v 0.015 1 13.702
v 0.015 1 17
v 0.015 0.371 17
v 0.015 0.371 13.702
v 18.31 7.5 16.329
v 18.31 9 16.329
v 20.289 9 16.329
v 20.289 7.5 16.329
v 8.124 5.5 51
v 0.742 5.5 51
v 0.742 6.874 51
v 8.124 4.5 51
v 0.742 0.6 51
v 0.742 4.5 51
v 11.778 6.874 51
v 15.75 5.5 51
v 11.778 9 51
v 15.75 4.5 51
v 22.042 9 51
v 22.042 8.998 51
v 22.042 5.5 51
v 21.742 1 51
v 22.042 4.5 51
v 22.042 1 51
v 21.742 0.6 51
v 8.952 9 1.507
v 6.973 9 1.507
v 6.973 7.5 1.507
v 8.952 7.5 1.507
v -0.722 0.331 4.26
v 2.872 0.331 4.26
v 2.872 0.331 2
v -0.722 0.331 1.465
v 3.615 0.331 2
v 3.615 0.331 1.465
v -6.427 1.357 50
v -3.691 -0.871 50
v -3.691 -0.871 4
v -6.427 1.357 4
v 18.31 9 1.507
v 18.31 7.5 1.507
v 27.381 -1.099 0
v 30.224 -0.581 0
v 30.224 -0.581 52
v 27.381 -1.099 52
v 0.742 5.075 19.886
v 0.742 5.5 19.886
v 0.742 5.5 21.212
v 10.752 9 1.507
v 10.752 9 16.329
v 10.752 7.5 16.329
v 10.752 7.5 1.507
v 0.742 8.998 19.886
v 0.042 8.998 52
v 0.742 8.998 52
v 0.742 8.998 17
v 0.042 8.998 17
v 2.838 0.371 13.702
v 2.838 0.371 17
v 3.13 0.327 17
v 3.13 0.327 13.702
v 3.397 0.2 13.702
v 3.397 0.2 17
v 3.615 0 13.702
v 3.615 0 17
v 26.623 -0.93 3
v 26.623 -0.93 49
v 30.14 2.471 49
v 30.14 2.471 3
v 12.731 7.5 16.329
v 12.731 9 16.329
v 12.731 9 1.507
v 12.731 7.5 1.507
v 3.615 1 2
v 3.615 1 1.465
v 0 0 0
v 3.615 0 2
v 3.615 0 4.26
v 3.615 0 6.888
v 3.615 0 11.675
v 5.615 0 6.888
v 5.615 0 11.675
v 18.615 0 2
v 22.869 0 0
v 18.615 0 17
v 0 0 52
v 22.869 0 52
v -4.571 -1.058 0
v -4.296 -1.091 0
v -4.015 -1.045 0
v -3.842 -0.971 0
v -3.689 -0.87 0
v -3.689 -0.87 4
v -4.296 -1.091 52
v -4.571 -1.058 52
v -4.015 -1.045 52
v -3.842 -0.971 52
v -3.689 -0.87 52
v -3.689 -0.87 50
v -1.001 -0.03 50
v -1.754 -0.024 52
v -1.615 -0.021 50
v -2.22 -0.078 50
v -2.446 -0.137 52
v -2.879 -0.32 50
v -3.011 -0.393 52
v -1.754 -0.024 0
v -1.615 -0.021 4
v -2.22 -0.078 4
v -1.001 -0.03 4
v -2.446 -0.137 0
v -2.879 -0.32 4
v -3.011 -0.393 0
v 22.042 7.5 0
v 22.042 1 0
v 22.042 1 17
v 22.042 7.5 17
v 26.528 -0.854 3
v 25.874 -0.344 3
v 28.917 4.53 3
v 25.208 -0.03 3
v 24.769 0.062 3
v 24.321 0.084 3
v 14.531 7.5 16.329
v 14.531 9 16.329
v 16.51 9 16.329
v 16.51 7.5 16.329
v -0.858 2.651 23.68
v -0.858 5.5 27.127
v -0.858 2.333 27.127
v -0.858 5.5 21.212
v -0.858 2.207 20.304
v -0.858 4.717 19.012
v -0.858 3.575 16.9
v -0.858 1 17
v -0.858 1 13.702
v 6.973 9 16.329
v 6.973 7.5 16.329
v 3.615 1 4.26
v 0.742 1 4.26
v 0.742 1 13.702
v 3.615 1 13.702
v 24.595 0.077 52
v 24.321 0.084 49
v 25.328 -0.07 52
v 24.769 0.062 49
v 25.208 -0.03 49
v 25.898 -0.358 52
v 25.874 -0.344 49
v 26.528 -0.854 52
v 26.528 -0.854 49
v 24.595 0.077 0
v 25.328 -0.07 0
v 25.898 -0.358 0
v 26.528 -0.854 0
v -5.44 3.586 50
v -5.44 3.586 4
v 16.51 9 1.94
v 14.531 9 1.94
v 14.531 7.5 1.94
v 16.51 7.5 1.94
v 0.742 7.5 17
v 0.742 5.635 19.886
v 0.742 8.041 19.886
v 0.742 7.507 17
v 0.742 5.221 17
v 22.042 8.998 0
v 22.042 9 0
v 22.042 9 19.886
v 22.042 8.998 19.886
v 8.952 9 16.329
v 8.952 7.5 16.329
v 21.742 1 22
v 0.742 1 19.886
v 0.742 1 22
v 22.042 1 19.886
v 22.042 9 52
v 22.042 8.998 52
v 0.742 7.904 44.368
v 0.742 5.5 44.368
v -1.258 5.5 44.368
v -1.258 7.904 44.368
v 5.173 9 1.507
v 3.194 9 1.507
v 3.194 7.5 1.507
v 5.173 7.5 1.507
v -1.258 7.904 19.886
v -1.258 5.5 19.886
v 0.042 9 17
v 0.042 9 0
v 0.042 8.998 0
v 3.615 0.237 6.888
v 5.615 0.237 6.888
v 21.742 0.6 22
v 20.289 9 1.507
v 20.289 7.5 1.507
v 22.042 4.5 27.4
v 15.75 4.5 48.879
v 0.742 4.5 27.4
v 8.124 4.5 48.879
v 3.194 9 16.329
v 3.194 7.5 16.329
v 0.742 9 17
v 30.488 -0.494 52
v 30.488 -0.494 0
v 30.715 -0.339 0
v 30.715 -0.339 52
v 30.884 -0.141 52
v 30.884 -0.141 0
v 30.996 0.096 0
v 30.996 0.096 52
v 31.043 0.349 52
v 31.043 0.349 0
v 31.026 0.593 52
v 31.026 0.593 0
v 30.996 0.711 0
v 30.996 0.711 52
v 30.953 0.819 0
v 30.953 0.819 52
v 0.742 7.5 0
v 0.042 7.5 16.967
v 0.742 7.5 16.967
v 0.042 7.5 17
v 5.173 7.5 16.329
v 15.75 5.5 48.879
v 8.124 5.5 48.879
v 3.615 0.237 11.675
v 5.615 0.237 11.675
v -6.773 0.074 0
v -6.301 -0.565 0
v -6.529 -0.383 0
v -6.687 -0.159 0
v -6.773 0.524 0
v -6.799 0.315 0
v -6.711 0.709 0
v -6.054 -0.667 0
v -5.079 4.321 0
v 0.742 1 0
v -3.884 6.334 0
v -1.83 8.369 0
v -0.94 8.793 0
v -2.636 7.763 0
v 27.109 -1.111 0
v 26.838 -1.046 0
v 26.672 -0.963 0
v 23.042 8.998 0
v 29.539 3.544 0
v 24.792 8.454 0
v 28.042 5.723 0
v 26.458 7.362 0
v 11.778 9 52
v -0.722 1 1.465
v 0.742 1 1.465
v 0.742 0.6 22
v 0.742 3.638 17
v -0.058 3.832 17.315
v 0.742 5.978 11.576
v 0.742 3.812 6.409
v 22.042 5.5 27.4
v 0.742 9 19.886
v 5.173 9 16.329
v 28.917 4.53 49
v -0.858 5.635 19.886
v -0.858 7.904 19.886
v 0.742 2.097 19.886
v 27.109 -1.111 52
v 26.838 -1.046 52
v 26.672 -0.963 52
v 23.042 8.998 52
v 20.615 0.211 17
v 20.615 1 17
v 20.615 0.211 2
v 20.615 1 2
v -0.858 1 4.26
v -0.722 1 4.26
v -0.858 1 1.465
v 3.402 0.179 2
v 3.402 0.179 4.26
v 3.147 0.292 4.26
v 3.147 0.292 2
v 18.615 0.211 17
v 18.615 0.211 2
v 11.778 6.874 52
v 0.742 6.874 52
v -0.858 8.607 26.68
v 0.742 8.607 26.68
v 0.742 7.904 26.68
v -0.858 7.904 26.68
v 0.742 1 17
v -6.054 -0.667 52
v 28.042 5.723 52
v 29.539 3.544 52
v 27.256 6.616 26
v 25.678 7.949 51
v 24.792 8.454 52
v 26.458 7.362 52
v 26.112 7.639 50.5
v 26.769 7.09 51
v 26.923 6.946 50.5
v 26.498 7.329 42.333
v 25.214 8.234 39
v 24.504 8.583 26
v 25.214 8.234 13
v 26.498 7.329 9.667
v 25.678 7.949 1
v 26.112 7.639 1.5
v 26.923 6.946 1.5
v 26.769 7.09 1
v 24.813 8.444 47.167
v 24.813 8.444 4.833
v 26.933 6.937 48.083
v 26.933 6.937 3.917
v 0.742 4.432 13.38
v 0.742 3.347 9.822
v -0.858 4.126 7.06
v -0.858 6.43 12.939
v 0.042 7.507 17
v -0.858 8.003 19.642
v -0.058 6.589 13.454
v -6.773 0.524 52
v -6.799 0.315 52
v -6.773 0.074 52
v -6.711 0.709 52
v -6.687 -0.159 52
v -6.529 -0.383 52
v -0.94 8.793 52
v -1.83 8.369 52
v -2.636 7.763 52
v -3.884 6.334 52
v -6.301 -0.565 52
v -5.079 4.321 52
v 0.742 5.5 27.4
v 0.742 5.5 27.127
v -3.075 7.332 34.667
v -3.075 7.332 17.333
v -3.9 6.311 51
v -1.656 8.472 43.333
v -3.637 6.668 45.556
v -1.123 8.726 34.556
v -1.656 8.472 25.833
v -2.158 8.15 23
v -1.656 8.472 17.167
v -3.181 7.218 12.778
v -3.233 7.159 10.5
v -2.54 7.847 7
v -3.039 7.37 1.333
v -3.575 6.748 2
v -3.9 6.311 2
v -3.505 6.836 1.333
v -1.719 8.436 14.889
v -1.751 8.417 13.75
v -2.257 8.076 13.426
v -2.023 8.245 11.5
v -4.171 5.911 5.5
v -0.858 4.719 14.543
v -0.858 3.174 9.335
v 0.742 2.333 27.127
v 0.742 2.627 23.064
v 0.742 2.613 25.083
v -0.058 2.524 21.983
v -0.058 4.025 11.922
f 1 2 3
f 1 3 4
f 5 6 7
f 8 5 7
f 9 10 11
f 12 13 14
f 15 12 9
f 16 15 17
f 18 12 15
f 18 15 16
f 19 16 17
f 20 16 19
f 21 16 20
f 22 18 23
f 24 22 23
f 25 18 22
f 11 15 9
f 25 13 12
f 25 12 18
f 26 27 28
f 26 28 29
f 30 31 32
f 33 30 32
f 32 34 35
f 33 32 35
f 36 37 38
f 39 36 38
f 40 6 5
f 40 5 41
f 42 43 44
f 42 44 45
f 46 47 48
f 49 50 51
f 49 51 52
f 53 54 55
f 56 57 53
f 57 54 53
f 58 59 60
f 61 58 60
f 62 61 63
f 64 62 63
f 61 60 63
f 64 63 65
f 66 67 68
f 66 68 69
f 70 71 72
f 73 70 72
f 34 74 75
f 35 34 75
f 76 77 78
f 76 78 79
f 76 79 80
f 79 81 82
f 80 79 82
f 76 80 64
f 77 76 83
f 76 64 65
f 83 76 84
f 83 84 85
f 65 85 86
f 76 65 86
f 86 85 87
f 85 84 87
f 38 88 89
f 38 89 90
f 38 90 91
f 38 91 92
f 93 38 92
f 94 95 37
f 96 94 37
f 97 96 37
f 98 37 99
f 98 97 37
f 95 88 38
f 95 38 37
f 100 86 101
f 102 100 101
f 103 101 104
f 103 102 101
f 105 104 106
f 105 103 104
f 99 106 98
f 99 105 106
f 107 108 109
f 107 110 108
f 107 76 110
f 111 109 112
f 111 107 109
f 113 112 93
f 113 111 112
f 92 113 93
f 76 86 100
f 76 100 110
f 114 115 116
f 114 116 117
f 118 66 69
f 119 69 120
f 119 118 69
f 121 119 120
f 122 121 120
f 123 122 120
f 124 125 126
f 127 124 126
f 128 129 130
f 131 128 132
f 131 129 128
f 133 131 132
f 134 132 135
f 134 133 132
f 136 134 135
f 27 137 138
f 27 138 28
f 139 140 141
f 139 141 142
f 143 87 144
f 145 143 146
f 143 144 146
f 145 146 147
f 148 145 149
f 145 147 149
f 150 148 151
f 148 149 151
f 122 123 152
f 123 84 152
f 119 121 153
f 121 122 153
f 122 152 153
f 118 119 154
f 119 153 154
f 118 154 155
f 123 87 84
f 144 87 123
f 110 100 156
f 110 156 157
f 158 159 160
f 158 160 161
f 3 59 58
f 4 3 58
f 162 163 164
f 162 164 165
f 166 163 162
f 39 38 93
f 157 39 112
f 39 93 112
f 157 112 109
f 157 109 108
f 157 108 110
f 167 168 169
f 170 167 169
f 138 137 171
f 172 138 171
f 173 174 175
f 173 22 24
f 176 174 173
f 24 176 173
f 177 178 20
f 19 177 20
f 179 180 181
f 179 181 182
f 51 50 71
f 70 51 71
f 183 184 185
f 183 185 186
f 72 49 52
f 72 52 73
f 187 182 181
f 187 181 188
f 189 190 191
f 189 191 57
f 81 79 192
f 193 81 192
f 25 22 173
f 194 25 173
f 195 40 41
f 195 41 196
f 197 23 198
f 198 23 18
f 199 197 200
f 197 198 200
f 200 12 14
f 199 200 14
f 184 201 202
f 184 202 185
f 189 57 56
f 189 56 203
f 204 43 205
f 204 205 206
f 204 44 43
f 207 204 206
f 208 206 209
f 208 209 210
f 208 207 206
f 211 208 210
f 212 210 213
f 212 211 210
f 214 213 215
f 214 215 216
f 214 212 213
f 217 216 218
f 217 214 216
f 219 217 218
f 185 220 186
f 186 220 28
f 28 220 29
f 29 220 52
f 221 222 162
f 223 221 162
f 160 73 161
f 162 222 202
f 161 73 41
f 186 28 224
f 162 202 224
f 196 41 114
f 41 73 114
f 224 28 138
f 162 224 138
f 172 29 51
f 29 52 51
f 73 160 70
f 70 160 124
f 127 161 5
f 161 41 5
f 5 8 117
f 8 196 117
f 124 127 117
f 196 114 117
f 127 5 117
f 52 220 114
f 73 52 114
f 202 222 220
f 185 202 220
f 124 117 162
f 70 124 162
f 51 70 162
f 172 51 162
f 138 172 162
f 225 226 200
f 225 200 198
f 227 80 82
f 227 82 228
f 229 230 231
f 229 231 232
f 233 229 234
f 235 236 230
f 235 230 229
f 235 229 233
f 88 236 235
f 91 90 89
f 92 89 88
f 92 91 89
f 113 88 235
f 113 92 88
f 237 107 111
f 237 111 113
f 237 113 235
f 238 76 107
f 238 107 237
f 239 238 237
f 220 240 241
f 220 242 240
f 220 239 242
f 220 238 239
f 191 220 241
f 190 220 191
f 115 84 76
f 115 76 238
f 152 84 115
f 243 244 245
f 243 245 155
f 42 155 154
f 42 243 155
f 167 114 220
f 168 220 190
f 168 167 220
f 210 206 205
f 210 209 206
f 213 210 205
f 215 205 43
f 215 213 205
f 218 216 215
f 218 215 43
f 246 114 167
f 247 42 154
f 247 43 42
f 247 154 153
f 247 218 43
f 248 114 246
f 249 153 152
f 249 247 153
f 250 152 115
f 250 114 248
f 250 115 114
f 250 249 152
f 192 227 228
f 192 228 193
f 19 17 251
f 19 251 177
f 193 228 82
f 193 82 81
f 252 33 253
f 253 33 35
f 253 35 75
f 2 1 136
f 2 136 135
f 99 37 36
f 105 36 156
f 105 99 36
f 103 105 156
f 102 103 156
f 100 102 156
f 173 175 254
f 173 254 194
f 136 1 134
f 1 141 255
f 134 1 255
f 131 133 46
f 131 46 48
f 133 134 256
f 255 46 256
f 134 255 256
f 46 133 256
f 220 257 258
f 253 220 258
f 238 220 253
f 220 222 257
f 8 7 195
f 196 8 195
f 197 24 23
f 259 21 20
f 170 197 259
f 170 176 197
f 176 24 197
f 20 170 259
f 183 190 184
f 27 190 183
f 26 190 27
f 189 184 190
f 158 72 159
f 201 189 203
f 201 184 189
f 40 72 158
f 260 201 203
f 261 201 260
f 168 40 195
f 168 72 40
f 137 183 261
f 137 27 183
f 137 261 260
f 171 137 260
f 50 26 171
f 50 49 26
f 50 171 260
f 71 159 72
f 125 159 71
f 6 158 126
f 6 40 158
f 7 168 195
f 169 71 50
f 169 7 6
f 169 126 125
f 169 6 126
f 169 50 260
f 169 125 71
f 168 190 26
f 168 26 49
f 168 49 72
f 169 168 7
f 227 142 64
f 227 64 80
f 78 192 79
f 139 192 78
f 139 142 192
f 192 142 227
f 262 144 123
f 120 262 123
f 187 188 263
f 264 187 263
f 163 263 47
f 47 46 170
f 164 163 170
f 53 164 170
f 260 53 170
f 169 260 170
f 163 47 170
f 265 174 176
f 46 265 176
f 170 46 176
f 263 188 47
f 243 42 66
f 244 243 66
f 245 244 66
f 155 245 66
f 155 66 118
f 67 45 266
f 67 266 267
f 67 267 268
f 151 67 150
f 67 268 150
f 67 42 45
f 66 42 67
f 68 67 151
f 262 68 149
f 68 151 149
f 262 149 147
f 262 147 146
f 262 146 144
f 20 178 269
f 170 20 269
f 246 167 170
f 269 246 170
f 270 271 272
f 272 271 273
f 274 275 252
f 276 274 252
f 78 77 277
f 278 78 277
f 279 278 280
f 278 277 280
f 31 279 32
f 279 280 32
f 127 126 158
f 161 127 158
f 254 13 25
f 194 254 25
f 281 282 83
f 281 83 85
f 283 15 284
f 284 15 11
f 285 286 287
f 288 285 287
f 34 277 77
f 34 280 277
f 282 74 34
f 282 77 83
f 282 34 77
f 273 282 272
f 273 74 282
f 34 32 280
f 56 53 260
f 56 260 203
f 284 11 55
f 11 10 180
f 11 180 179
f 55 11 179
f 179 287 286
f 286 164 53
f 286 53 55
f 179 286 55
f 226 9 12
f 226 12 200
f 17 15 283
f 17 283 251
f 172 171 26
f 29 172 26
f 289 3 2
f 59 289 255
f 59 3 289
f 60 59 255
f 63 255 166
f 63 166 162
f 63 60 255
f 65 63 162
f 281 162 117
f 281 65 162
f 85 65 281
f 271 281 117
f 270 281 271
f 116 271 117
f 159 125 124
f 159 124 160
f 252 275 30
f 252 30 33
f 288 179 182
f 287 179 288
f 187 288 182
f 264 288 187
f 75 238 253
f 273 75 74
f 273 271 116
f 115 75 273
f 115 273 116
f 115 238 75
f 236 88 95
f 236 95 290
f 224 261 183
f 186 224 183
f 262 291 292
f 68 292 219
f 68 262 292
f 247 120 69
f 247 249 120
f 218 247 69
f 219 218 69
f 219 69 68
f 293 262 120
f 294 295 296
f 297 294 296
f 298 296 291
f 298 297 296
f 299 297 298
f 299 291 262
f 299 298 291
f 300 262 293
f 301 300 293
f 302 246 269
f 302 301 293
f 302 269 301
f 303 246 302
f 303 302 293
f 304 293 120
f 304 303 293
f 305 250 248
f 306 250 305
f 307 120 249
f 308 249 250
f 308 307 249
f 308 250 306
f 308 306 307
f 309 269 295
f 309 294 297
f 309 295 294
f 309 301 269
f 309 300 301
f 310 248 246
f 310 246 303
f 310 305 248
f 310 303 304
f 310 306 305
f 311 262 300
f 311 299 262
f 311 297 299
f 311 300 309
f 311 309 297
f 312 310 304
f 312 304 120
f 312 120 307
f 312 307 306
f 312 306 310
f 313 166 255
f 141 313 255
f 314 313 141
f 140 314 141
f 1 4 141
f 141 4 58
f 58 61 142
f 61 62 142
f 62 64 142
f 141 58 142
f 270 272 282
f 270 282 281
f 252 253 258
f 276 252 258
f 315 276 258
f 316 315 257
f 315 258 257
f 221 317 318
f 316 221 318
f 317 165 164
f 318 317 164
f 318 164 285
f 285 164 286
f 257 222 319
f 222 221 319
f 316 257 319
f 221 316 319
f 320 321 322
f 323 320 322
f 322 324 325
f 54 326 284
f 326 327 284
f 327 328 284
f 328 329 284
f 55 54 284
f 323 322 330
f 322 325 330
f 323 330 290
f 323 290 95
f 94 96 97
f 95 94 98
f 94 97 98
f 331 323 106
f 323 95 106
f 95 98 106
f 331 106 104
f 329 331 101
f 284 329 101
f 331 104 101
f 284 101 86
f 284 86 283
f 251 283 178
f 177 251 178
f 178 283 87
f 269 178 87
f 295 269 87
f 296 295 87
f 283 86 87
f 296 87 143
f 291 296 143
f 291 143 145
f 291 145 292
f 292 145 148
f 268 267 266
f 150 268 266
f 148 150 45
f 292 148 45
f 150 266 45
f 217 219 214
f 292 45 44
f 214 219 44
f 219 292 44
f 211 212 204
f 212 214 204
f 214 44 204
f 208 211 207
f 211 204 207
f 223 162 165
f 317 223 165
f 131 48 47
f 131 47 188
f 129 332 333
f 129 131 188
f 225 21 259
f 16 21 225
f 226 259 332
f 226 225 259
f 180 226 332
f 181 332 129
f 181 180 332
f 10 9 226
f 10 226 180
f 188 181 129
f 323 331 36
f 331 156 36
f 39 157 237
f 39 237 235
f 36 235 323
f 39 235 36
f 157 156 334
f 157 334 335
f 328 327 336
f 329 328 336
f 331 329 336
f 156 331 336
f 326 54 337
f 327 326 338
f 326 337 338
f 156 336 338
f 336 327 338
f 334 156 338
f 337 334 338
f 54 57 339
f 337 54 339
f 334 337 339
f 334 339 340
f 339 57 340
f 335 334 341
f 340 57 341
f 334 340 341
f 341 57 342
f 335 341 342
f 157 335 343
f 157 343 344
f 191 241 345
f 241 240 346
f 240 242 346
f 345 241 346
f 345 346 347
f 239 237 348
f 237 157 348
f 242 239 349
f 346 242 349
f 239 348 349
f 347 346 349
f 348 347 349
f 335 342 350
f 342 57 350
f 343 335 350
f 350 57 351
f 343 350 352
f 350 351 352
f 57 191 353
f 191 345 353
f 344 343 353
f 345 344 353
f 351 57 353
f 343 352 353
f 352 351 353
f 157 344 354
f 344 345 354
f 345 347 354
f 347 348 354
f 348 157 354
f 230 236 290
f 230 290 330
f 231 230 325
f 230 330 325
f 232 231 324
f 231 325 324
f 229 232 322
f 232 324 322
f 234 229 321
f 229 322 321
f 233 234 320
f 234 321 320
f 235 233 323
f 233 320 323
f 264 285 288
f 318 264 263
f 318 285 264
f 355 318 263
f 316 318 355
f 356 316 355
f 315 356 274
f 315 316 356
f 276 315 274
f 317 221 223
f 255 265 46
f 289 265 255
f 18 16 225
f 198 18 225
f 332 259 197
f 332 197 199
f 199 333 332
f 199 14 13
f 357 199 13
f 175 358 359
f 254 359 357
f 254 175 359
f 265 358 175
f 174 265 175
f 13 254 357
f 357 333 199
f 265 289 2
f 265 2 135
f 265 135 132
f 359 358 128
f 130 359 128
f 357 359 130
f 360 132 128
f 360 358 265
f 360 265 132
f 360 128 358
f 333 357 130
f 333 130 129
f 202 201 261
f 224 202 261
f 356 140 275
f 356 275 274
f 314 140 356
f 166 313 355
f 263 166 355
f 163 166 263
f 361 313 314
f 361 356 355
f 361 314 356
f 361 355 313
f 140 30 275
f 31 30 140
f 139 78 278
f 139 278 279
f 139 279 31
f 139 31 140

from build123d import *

# Parameters (mm, degrees)
BOSS_EXTRUDE2_DEPTH      = 52
FILLET2_R                = 1
CUT_EXTRUDE2_DEPTH       = 3
CUT_EXTRUDE2_DEPTH_BACK  = 6
SKETCH10_W               = 2.350757351
SKETCH10_H               = 46
SKETCH11_W               = 17
SKETCH11_H               = 15
PELTIER_DEPTH            = 10
SKETCH12_W               = 21
SKETCH12_H               = 29
BATTERY_DEPTH            = 0.4
SKETCH14_W               = 21.3
SKETCH14_H               = 1
BOSS_EXTRUDE4_DEPTH      = 7.999920354
SKETCH15_W               = 3.297714658
SKETCH15_H               = 0.629450307
CUT_EXTRUDE5_DEPTH       = 3.6
SKETCH16_W               = 2.795507754
SKETCH16_H               = 0.669410668
CUT_EXTRUDE6_DEPTH       = 4.337027413
FILLET3_R                = 1
CUT_EXTRUDE7_DEPTH       = 1.6
CUT_EXTRUDE8_DEPTH       = 1.6
FILLET4_R                = 1
FILLET5_R                = 1
SKETCH19_W               = 21.3
SKETCH19_H               = 1
BOSS_EXTRUDE5_DEPTH      = 23.6
SKETCH20_W               = 7.625924169
SKETCH20_H               = 2.120993271
CUT_EXTRUDE9_DEPTH       = 2.6
SKETCH21_W               = 21.3
SKETCH21_H               = 2.886084762
BOSS_EXTRUDE6_DEPTH      = 8
SKETCH22_W               = 17
SKETCH22_H               = 1.5
BOSS_EXTRUDE7_DEPTH      = 22
SKETCH23_W               = 24.481547991
SKETCH23_H               = 2.403526745
CUT_EXTRUDE10_DEPTH      = 2
SKETCH24_W               = 15
SKETCH24_H               = 0.211445756
BOSS_EXTRUDE8_DEPTH      = 2
SKETCH25_W               = 4.787241237
SKETCH25_H               = 0.237383131
BOSS_EXTRUDE9_DEPTH      = 2
SKETCH26_W               = 11.036128308
SKETCH26_H               = 2.126226966
CUT_EXTRUDE11_DEPTH      = 2
CUT_EXTRUDE12_DEPTH      = 2
CUT_EXTRUDE12_DEPTH_BACK = 11
SKETCH27_W               = 46
SKETCH27_H               = 2.33
SKETCH28_W               = 1.978966
SKETCH28_H               = 14.822133623
SKETCH28_H_2             = 14.389327905
SKETCH28_W_2             = 1.978965999
CUT_EXTRUDE13_DEPTH      = 3


with BuildPart() as part:
    # Sketch1 → Boss-Extrude2 (new body)
    with BuildSketch(Plane.XY):
        with BuildLine():
            Line((-4.066957942, -1.190846618), (-7.240355005, -0.354620493))
            add(Edge.make_bspline(
                [(0.042333709, 8.998333002), (-4.213116867, 8.648828695), (-5.962383558, 1.81462105), (-7.240355005, -0.354620493)],
                knots=[0, 0, 0, 0, 1, 1, 1, 1], degree=3))
            Line((0.042333709, 8.998333002), (0.742333709, 8.998333002))
            Line((0.742333709, 8.998333002), (0.742333709, 1))
            Line((0.742333709, 1), (22.042333709, 1))
            Line((22.042333709, 1), (22.042333709, 8.998333002))
            Line((22.042333709, 8.998333002), (23.042333709, 8.998333002))
            add(Edge.make_bspline(
                [(23.042333709, 8.998333002), (27.852391375, 8.27132168), (31.467788923, -0.354620493)],
                knots=[0, 0, 0, 1, 1, 1], degree=2))
            Line((31.467788923, -0.354620493), (26.875523276, -1.190846618))
            add(Edge.make_bspline(
                [(22.86911945, 0), (24.564241842, 0.074416087), (25.297281614, 0.429058332), (26.875523276, -1.190846618)],
                knots=[0, 0, 0, 0, 1, 1, 1, 1], degree=3))
            Line((22.86911945, 0), (0, 0))
            add(Edge.make_bspline(
                [(0, 0), (-1.870814346, -0.163675047), (-2.239916233, 0.430706612), (-4.066957942, -1.190846618)],
                knots=[0, 0, 0, 0, 1, 1, 1, 1], degree=3))
        make_face()
    extrude(amount=BOSS_EXTRUDE2_DEPTH)

    # Fillet2
    fillet2_edges = [part.edges().sort_by_distance(p)[0] for p in [
        (-4.066957942, -1.190846618, 26),
        (-7.240355005, -0.354620493, 26),
    ]]
    fillet(fillet2_edges, radius=FILLET2_R)

    # Sketch10 → Cut-Extrude2 (cut, two sides: drawn at the far end of the back side and taken through both)
    with BuildSketch(Plane(origin=(-4.380890916, 3.569201652, 0), x_dir=(0.6316290075695021, 0.7752707893354205, 0), z_dir=(-0.7752707893354205, 0.6316290075695021, 0)).offset(-CUT_EXTRUDE2_DEPTH_BACK)):
        with Locations((-1.831509184, -27)):
            Rectangle(SKETCH10_W, SKETCH10_H)
    extrude(amount=CUT_EXTRUDE2_DEPTH + CUT_EXTRUDE2_DEPTH_BACK, mode=Mode.SUBTRACT)

    # Sketch11 → Peltier (cut)
    with BuildSketch(Plane(origin=(0, 1, 0), x_dir=(1, 0, 0), z_dir=(0, 1, 0))):
        with Locations((12.114692368, -9.5)):
            Rectangle(SKETCH11_W, SKETCH11_H)
    extrude(amount=-PELTIER_DEPTH, mode=Mode.SUBTRACT)

    # Sketch12 → Battery (cut)
    with BuildSketch(Plane(origin=(0, 1, 0), x_dir=(1, 0, 0), z_dir=(0, 1, 0))):
        with Locations((11.242333709, -36.5)):
            Rectangle(SKETCH12_W, SKETCH12_H)
    extrude(amount=-BATTERY_DEPTH, mode=Mode.SUBTRACT)

    # Sketch14 → Boss-Extrude4 (add)
    with BuildSketch(Plane(origin=(0, 1, 0), x_dir=(1, 0, 0), z_dir=(0, 1, 0))):
        with Locations((11.392333709, -51.5)):
            Rectangle(SKETCH14_W, SKETCH14_H)
    extrude(amount=BOSS_EXTRUDE4_DEPTH)

    # Sketch15 → Cut-Extrude5 (cut)
    with BuildSketch(Plane(origin=(3.614692368, 0, 0), x_dir=(0, 0, -1), z_dir=(1, 0, 0))):
        with Locations((-15.351142671, 0.685274847)):
            Rectangle(SKETCH15_W, SKETCH15_H)
    extrude(amount=-CUT_EXTRUDE5_DEPTH, mode=Mode.SUBTRACT)

    # Sketch16 → Cut-Extrude6 (cut)
    with BuildSketch(Plane(origin=(3.614692368, 0, 0), x_dir=(0, 0, -1), z_dir=(1, 0, 0))):
        with Locations((-2.862635658, 0.665294666)):
            Rectangle(SKETCH16_W, SKETCH16_H)
    extrude(amount=-CUT_EXTRUDE6_DEPTH, mode=Mode.SUBTRACT)

    # Fillet3
    # the kernel refuses this fillet: 1 mm, written as the material it takes off along each edge
    with BuildSketch(Plane(origin=(3.614692368, 0.330589332, 2), x_dir=(0, -1, 0), z_dir=(0, 0, 1))) as fillet3_piece_1:
        with BuildLine():
            CenterArc((1, -0.742892561), FILLET3_R, 132.021596152, 47.978403848)
            Line((0, -0.742892561), (0, 0))
            Line((0, 0), (0.330589332, 0))
        make_face()
    extrude(amount=2.260389535, mode=Mode.SUBTRACT)
    with BuildSketch(Plane(origin=(3.614692368, 0.370549693, 17), x_dir=(0, -1, 0), z_dir=(0, 0, -1))) as fillet3_piece_2:
        with BuildLine():
            CenterArc((1, 0.77704074), FILLET3_R, 180, 50.990421184)
            Line((0, 0.77704074), (0, 0))
            Line((0, 0), (0.370549693, 0))
        make_face()
    extrude(amount=3.297714658, mode=Mode.SUBTRACT)

    # Sketch17 → Cut-Extrude7 (cut)
    with BuildSketch(Plane(origin=(0.742333709, 0, 0), x_dir=(0, 0, -1), z_dir=(1, 0, 0))):
        with BuildLine():
            Line((-26.679947222, 8.607264172), (-26.679947222, 5.897267678))
            add(Edge.make_bspline(
                [(-4.260389535, 1), (-14.867625221, 6.272509714), (-26.679947222, 5.897267678)],
                knots=[0, 0, 0, 1, 1, 1], degree=2))
            Line((-4.260389535, 1), (-1.464881781, 1))
            add(Edge.make_bspline(
                [(-1.464881781, 1), (-12.835212302, 8.374655541), (-26.679947222, 8.607264172)],
                knots=[0, 0, 0, 1, 1, 1], degree=2))
        make_face()
    extrude(amount=-CUT_EXTRUDE7_DEPTH, mode=Mode.SUBTRACT)

    # Sketch18 → Cut-Extrude8 (cut)
    with BuildSketch(Plane(origin=(0.742333709, 0, 0), x_dir=(0, 0, -1), z_dir=(1, 0, 0))):
        with BuildLine():
            Line((-27.127269804, 2.333242891), (-27.127269804, 5.881050361))
            add(Edge.make_bspline(
                [(-13.702285342, 1), (-19.59820355, 6.798459793), (-27.127269804, 5.881050361)],
                knots=[0, 0, 0, 1, 1, 1], degree=2))
            Line((-13.702285342, 1), (-17, 1))
            add(Edge.make_bspline(
                [(-17, 1), (-21.902562333, 3.381704282), (-27.127269804, 2.333242891)],
                knots=[0, 0, 0, 1, 1, 1], degree=2))
        make_face()
    extrude(amount=-CUT_EXTRUDE8_DEPTH, mode=Mode.SUBTRACT)

    # Fillet4
    fillet4_edges = [part.edges().sort_by_distance(p)[0] for p in [
        (26.875523276, -1.190846618, 26),
    ]]
    fillet(fillet4_edges, radius=FILLET4_R)

    # Fillet5
    fillet5_edges = [part.edges().sort_by_distance(p)[0] for p in [
        (31.467788923, -0.354620493, 26),
    ]]
    fillet(fillet5_edges, radius=FILLET5_R)

    # Sketch19 → Boss-Extrude5 (add)
    with BuildSketch(Plane(origin=(0, 0, 51), x_dir=(-1, 0, 0), z_dir=(0, 0, -1))):
        with Locations((-11.392333709, 5)):
            Rectangle(SKETCH19_W, SKETCH19_H)
    extrude(amount=BOSS_EXTRUDE5_DEPTH)

    # Sketch20 → Cut-Extrude9 (cut)
    with BuildSketch(Plane(origin=(0, 5.5, 0), x_dir=(1, 0, 0), z_dir=(0, 1, 0))):
        with Locations((11.936871332, -49.939503364)):
            Rectangle(SKETCH20_W, SKETCH20_H)
    extrude(amount=-CUT_EXTRUDE9_DEPTH, mode=Mode.SUBTRACT)

    # Sketch21 → Boss-Extrude6 (add)
    with BuildSketch(Plane(origin=(0, 1, 0), x_dir=(1, 0, 0), z_dir=(0, 1, 0))):
        with Locations((11.392333709, -18.443042381)):
            Rectangle(SKETCH21_W, SKETCH21_H)
    extrude(amount=BOSS_EXTRUDE6_DEPTH)

    # Sketch22 → Boss-Extrude7 (add)
    with BuildSketch(Plane.ZY.offset(-22.042333709)):
        with Locations((8.5, 8.25)):
            Rectangle(SKETCH22_W, SKETCH22_H)
    extrude(amount=BOSS_EXTRUDE7_DEPTH)

    # Sketch23 → Cut-Extrude10 (cut)
    with BuildSketch(Plane(origin=(0.742333709, 0, 0), x_dir=(0, 0, -1), z_dir=(1, 0, 0))):
        with Locations((-32.126858758, 6.701763373)):
            Rectangle(SKETCH23_W, SKETCH23_H)
    extrude(amount=-CUT_EXTRUDE10_DEPTH, mode=Mode.SUBTRACT)

    # Sketch24 → Boss-Extrude8 (add)
    with BuildSketch(Plane.ZY.offset(-20.614692368)):
        with Locations((9.5, 0.105722878)):
            Rectangle(SKETCH24_W, SKETCH24_H)
    extrude(amount=BOSS_EXTRUDE8_DEPTH)

    # Sketch25 → Boss-Extrude9 (add)
    with BuildSketch(Plane(origin=(3.614692368, 0, 0), x_dir=(0, 0, -1), z_dir=(1, 0, 0))):
        with Locations((-9.281203123, 0.118691566)):
            Rectangle(SKETCH25_W, SKETCH25_H)
    extrude(amount=BOSS_EXTRUDE9_DEPTH)

    # Sketch26 → Cut-Extrude11 (cut)
    with BuildSketch(Plane(origin=(0, 0, 51), x_dir=(-1, 0, 0), z_dir=(0, 0, -1))):
        with Locations((-6.260397863, 7.936806871)):
            Rectangle(SKETCH26_W, SKETCH26_H)
    extrude(amount=-CUT_EXTRUDE11_DEPTH, mode=Mode.SUBTRACT)

    # Sketch27 → Cut-Extrude12 (cut, two sides: drawn at the far end of the back side and taken through both)
    with BuildSketch(Plane(origin=(16.401330443, 15.864191281, 0), x_dir=(0, 0, -1), z_dir=(0.7187787233935903, 0.6952389134654942, 0)).offset(-CUT_EXTRUDE12_DEPTH_BACK)):
        with Locations((-26, -18.013212029)):
            Rectangle(SKETCH27_W, SKETCH27_H)
    extrude(amount=CUT_EXTRUDE12_DEPTH + CUT_EXTRUDE12_DEPTH_BACK, mode=Mode.SUBTRACT)

    # Sketch28 → Cut-Extrude13 (cut)
    with BuildSketch(Plane(origin=(0, 9, 0), x_dir=(1, 0, 0), z_dir=(0, 1, 0))):
        with Locations((19.299375066, -8.918059871)):
            Rectangle(SKETCH28_W, SKETCH28_H)
        with Locations((15.520409066, -9.13446273)):
            Rectangle(SKETCH28_W, SKETCH28_H_2)
        with Locations((11.741443067, -8.918059871)):
            Rectangle(SKETCH28_W_2, SKETCH28_H)
        with Locations((7.962477067, -8.918059871)):
            Rectangle(SKETCH28_W, SKETCH28_H)
        with Locations((4.183511067, -8.918059871)):
            Rectangle(SKETCH28_W, SKETCH28_H)
    extrude(amount=-CUT_EXTRUDE13_DEPTH, mode=Mode.SUBTRACT)


solid = part.part
